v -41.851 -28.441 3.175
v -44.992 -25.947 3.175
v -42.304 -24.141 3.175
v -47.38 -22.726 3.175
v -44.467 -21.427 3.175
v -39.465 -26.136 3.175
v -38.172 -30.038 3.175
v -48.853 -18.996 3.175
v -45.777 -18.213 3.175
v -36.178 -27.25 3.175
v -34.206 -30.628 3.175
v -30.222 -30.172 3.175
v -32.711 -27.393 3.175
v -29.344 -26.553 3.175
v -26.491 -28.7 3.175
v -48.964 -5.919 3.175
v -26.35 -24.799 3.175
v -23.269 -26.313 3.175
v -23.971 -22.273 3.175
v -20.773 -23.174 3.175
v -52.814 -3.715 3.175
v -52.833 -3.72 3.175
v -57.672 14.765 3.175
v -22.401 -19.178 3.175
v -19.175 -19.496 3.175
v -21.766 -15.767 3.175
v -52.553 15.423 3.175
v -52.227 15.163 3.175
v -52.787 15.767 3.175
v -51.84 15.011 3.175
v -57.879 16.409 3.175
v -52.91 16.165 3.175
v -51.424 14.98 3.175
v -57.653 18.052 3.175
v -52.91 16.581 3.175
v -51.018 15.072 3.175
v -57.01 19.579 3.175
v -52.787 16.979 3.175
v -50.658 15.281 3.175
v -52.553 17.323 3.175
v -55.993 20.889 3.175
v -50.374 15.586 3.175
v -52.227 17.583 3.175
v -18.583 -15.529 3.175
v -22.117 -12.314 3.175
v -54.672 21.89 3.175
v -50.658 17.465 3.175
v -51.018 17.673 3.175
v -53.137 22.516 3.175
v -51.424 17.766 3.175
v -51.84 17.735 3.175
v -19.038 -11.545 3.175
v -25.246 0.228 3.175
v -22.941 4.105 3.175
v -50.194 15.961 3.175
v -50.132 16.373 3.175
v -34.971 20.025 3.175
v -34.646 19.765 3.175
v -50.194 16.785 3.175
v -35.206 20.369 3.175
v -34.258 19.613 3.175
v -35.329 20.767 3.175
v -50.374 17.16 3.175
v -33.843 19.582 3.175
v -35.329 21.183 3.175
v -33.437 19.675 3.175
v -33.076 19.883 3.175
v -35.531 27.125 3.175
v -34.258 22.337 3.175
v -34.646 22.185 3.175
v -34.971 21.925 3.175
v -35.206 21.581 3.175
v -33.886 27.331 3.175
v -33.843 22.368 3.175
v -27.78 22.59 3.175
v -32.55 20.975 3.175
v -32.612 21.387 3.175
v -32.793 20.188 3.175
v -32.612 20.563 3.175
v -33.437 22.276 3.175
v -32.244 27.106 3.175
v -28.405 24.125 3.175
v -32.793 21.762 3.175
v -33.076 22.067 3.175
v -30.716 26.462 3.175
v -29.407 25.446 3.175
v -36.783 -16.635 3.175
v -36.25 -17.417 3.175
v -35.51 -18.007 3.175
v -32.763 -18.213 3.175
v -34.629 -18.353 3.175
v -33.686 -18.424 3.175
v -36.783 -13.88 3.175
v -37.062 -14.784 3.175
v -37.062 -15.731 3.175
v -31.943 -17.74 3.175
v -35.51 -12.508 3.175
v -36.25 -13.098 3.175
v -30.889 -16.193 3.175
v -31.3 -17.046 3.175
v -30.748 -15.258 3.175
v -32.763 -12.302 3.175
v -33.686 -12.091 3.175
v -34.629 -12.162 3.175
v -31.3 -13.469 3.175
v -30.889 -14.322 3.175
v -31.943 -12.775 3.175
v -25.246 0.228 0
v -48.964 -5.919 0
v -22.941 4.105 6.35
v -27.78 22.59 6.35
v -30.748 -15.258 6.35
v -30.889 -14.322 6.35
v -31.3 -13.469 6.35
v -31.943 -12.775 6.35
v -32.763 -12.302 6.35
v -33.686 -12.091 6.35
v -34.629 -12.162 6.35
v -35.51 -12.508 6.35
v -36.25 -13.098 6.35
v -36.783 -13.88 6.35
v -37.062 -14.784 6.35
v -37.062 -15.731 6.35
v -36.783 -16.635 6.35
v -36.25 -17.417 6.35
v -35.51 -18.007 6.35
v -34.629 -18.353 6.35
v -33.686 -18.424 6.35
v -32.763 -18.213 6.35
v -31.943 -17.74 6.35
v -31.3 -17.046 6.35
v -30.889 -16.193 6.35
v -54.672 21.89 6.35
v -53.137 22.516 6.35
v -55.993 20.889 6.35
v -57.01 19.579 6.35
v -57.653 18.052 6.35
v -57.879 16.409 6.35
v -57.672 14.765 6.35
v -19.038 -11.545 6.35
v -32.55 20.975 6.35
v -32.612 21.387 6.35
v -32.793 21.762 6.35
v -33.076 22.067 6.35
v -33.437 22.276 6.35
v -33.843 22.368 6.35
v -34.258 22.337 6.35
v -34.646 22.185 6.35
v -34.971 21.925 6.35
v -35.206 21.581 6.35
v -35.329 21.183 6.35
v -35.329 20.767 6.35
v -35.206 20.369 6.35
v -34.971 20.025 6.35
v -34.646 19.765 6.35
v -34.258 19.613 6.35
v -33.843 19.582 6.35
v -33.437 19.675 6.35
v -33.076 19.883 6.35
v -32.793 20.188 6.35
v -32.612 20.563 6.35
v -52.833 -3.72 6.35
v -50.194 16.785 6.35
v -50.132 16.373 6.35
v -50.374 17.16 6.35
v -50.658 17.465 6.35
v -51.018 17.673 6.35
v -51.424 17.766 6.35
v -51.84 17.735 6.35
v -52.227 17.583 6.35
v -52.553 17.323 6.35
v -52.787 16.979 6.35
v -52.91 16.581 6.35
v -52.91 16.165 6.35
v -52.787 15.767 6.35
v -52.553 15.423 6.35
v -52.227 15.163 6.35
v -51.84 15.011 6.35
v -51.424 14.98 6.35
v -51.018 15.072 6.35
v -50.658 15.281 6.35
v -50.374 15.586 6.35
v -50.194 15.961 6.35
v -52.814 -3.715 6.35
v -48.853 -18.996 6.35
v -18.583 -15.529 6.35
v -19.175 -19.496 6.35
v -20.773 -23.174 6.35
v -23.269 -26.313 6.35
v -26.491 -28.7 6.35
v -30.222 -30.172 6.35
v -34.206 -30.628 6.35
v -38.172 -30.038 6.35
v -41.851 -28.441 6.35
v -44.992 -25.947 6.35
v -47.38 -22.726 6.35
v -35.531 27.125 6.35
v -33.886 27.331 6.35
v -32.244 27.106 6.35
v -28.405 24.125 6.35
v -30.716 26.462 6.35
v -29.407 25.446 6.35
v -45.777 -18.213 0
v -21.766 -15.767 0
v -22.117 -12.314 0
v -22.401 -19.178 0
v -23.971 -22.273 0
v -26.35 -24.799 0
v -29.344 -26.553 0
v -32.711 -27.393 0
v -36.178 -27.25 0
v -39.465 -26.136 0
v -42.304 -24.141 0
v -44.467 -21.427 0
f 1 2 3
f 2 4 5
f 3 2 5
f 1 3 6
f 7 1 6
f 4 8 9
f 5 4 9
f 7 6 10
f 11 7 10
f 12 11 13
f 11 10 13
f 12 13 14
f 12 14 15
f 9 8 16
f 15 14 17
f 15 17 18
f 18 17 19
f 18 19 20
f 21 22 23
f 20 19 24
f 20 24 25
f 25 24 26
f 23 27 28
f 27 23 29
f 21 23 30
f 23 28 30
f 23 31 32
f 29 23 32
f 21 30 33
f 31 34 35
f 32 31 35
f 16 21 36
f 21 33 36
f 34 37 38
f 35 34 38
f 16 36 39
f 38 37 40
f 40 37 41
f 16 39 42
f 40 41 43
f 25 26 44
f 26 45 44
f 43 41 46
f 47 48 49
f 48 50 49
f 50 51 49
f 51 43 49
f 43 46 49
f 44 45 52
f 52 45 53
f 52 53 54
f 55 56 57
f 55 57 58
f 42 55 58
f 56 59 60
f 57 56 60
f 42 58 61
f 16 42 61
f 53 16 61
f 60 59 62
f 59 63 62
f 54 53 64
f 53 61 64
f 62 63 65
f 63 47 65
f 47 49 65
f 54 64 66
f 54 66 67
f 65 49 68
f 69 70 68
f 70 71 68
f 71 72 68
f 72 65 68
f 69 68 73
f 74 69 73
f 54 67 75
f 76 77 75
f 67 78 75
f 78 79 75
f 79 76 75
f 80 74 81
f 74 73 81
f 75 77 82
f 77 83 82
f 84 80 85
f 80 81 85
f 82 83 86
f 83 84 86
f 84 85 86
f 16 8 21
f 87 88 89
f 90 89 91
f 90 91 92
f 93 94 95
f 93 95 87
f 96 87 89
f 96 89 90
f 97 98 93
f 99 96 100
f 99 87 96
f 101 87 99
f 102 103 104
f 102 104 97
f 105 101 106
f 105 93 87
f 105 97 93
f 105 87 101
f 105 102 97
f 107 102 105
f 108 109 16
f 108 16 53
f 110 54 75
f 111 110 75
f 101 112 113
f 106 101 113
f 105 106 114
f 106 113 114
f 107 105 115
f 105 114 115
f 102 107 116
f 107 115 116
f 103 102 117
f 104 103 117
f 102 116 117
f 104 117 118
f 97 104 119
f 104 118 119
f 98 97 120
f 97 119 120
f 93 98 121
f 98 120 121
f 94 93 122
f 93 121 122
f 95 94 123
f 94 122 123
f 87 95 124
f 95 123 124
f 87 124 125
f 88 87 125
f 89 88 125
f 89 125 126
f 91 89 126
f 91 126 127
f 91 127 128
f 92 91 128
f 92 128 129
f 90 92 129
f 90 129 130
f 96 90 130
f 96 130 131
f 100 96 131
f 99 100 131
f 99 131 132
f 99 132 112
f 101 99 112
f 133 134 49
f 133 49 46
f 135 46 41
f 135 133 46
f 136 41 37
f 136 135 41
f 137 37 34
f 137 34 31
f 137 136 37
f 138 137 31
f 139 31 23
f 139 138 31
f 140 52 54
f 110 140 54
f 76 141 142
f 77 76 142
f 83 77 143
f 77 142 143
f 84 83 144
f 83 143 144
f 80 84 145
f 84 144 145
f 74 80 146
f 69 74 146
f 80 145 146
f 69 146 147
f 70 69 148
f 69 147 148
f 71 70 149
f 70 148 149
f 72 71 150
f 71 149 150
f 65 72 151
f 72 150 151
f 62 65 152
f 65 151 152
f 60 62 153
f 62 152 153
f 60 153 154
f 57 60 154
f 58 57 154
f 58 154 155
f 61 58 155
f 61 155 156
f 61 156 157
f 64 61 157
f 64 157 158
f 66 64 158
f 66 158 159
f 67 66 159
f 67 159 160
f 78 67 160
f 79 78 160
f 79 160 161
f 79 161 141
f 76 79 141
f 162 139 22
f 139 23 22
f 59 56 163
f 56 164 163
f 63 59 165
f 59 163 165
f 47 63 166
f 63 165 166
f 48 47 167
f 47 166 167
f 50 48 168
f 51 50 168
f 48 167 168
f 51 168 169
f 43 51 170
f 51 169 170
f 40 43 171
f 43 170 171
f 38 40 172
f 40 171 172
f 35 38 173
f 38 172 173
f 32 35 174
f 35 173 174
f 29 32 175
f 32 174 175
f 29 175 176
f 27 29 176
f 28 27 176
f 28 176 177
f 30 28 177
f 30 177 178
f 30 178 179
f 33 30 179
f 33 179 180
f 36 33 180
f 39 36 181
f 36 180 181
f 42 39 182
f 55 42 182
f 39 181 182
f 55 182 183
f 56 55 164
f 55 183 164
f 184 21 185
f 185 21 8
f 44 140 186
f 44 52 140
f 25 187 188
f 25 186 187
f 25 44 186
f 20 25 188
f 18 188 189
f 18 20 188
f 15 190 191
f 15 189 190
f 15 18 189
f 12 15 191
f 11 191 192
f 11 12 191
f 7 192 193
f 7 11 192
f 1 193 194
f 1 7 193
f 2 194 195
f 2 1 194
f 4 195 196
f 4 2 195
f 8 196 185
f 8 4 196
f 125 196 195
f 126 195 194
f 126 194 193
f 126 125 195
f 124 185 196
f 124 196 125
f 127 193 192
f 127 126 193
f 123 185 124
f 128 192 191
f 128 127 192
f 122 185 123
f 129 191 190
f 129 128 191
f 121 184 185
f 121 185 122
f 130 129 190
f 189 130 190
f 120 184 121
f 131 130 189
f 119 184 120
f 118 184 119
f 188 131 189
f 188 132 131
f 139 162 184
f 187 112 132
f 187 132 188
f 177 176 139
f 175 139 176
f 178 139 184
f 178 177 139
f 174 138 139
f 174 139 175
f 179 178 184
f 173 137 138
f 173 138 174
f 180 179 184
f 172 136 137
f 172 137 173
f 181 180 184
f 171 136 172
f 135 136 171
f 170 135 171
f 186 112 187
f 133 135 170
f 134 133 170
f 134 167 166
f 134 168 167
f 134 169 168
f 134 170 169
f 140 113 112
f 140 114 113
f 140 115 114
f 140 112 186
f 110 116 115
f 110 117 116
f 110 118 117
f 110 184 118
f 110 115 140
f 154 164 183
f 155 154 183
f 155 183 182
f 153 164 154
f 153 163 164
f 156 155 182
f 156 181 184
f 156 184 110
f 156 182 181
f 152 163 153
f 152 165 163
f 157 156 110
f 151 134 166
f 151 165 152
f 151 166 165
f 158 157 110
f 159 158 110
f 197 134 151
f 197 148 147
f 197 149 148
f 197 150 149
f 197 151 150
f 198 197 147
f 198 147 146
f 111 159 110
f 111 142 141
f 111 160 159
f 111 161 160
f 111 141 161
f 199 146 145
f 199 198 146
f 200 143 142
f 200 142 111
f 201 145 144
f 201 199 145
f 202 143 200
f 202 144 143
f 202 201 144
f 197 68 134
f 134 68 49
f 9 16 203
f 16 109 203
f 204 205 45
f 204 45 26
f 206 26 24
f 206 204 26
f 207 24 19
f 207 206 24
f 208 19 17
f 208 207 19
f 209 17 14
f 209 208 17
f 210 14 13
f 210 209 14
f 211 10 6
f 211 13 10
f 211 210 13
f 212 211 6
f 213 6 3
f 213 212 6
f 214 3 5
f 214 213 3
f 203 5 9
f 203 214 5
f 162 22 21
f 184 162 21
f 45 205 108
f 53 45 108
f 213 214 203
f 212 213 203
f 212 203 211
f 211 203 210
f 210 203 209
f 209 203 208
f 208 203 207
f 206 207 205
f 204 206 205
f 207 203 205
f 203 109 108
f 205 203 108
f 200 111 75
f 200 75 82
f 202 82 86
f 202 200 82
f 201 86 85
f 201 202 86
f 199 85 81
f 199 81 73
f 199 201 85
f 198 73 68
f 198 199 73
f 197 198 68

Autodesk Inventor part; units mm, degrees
ref_plane "YZ Plane" through (0, 0, 0) normal (1, 0, 0) x (0, 1, 0)
ref_plane "XZ Plane" through (0, 0, 0) normal (0, 1, 0) x (-1, 0, 0)
ref_plane "XY Plane" through (0, 0, 0) normal (0, 0, 1) x (1, 0, 0)
ref_plane "Work Plane1" through (0, 0, 0) normal (0, 0, 1) x (1, 0, 0)
sketch "Sketch1" plane through (0, 0, 0) normal (0, 0, 1) x (1, 0, 0)
  line L0 (-48.9636, -5.919) -> (-45.777, -18.2132)
  arc A0 (-45.777, -18.2132) -> (-22.1173, -12.3142) centre (-33.9472, -15.2637) ccw projected
  line L1 (-22.1173, -12.3142) -> (-25.2457, 0.2285)
  line L2 (-48.9636, -5.919) -> (-25.2457, 0.2285)
  point P0 (0, 0)
  point P1 (-37.0767, -2.9553)
  dimension "d0" = 12.2508
  dimension "d2" = 24.5017
  dimension "d3" = 12.7
extrude "Extrusion1" add sketch "Sketch1" along normal blind 3.175
sketch "Sketch2" plane through (0, 0, 3.175) normal (0, 0, 1) x (1, 0, 0)
  line L0 (-48.9636, -5.919) -> (-45.777, -18.2132) projected
  arc A0 (-45.777, -18.2132) -> (-22.1173, -12.3142) centre (-33.9472, -15.2637) ccw projected
  line L1 (-22.1173, -12.3142) -> (-25.2457, 0.2285) projected
  line L2 (-25.2457, 0.2285) -> (-48.9636, -5.919) projected
  line L3 (-48.9636, -5.919) -> (-45.777, -18.2132) projected
  arc A1 (-45.777, -18.2132) -> (-22.1173, -12.3142) centre (-33.9472, -15.2637) ccw projected
  line L4 (-22.1173, -12.3142) -> (-25.2457, 0.2285) projected
  line L5 (-25.2457, 0.2285) -> (-48.9636, -5.919) projected
  line L6 (-52.8328, -3.6427) -> (-48.8533, -18.9962)
  arc A2 (-48.8533, -18.9962) -> (-19.0376, -11.545) centre (-33.9472, -15.2637) ccw
  line L7 (-19.0376, -11.545) -> (-22.941, 4.1051)
  line L8 (-22.941, 4.1051) -> (-52.8328, -3.6427)
  line L9 (-52.8328, -3.72) -> (-22.941, 4.1051)
  line L10 (-22.941, 4.1051) -> (-29.388, 28.7327)
  line L11 (-29.388, 28.7327) -> (-59.2798, 20.9076)
  line L12 (-59.2798, 20.9076) -> (-52.8328, -3.72)
  point P0 (0, 0)
extrude "Extrusion2" add sketch "Sketch2" along normal blind 3.175 contours L2 L1 A0 L0 | L8 L9 L6 | L6 L9 L12 L11 L10 L8 | L9 L7 A2 L6
fillet "Fillet1" radius 6.35 2 edges at (-59.2798, 20.9076, 4.7625) (-29.388, 28.7327, 4.7625)
sketch "Sketch3" plane through (0, 0, 6.35) normal (0, 0, 1) x (1, 0, 0)
  circle A0 centre (-33.9229, -15.2576) radius 3.175
  point P0 (0, 0)
  dimension "d9" = 6.35
extrude "Extrusion3" cut sketch "Sketch3" against normal blind 3.175
sketch "Sketch4" plane through (0, 0, 6.35) normal (0, 0, 1) x (1, 0, 0)
  circle A0 centre (-51.5287, 16.3728) radius 1.397
  circle A1 centre (-33.9472, 20.9752) radius 1.397
  point P0 (0, 0)
  dimension "d12" = 2.794
  dimension "d13" = 2.794
extrude "Extrusion4" cut sketch "Sketch4" against normal up to next
equation "\"d0\" = 0.5 * d2"
properties part number "fingerBase01" material "Wood (Oak)"
